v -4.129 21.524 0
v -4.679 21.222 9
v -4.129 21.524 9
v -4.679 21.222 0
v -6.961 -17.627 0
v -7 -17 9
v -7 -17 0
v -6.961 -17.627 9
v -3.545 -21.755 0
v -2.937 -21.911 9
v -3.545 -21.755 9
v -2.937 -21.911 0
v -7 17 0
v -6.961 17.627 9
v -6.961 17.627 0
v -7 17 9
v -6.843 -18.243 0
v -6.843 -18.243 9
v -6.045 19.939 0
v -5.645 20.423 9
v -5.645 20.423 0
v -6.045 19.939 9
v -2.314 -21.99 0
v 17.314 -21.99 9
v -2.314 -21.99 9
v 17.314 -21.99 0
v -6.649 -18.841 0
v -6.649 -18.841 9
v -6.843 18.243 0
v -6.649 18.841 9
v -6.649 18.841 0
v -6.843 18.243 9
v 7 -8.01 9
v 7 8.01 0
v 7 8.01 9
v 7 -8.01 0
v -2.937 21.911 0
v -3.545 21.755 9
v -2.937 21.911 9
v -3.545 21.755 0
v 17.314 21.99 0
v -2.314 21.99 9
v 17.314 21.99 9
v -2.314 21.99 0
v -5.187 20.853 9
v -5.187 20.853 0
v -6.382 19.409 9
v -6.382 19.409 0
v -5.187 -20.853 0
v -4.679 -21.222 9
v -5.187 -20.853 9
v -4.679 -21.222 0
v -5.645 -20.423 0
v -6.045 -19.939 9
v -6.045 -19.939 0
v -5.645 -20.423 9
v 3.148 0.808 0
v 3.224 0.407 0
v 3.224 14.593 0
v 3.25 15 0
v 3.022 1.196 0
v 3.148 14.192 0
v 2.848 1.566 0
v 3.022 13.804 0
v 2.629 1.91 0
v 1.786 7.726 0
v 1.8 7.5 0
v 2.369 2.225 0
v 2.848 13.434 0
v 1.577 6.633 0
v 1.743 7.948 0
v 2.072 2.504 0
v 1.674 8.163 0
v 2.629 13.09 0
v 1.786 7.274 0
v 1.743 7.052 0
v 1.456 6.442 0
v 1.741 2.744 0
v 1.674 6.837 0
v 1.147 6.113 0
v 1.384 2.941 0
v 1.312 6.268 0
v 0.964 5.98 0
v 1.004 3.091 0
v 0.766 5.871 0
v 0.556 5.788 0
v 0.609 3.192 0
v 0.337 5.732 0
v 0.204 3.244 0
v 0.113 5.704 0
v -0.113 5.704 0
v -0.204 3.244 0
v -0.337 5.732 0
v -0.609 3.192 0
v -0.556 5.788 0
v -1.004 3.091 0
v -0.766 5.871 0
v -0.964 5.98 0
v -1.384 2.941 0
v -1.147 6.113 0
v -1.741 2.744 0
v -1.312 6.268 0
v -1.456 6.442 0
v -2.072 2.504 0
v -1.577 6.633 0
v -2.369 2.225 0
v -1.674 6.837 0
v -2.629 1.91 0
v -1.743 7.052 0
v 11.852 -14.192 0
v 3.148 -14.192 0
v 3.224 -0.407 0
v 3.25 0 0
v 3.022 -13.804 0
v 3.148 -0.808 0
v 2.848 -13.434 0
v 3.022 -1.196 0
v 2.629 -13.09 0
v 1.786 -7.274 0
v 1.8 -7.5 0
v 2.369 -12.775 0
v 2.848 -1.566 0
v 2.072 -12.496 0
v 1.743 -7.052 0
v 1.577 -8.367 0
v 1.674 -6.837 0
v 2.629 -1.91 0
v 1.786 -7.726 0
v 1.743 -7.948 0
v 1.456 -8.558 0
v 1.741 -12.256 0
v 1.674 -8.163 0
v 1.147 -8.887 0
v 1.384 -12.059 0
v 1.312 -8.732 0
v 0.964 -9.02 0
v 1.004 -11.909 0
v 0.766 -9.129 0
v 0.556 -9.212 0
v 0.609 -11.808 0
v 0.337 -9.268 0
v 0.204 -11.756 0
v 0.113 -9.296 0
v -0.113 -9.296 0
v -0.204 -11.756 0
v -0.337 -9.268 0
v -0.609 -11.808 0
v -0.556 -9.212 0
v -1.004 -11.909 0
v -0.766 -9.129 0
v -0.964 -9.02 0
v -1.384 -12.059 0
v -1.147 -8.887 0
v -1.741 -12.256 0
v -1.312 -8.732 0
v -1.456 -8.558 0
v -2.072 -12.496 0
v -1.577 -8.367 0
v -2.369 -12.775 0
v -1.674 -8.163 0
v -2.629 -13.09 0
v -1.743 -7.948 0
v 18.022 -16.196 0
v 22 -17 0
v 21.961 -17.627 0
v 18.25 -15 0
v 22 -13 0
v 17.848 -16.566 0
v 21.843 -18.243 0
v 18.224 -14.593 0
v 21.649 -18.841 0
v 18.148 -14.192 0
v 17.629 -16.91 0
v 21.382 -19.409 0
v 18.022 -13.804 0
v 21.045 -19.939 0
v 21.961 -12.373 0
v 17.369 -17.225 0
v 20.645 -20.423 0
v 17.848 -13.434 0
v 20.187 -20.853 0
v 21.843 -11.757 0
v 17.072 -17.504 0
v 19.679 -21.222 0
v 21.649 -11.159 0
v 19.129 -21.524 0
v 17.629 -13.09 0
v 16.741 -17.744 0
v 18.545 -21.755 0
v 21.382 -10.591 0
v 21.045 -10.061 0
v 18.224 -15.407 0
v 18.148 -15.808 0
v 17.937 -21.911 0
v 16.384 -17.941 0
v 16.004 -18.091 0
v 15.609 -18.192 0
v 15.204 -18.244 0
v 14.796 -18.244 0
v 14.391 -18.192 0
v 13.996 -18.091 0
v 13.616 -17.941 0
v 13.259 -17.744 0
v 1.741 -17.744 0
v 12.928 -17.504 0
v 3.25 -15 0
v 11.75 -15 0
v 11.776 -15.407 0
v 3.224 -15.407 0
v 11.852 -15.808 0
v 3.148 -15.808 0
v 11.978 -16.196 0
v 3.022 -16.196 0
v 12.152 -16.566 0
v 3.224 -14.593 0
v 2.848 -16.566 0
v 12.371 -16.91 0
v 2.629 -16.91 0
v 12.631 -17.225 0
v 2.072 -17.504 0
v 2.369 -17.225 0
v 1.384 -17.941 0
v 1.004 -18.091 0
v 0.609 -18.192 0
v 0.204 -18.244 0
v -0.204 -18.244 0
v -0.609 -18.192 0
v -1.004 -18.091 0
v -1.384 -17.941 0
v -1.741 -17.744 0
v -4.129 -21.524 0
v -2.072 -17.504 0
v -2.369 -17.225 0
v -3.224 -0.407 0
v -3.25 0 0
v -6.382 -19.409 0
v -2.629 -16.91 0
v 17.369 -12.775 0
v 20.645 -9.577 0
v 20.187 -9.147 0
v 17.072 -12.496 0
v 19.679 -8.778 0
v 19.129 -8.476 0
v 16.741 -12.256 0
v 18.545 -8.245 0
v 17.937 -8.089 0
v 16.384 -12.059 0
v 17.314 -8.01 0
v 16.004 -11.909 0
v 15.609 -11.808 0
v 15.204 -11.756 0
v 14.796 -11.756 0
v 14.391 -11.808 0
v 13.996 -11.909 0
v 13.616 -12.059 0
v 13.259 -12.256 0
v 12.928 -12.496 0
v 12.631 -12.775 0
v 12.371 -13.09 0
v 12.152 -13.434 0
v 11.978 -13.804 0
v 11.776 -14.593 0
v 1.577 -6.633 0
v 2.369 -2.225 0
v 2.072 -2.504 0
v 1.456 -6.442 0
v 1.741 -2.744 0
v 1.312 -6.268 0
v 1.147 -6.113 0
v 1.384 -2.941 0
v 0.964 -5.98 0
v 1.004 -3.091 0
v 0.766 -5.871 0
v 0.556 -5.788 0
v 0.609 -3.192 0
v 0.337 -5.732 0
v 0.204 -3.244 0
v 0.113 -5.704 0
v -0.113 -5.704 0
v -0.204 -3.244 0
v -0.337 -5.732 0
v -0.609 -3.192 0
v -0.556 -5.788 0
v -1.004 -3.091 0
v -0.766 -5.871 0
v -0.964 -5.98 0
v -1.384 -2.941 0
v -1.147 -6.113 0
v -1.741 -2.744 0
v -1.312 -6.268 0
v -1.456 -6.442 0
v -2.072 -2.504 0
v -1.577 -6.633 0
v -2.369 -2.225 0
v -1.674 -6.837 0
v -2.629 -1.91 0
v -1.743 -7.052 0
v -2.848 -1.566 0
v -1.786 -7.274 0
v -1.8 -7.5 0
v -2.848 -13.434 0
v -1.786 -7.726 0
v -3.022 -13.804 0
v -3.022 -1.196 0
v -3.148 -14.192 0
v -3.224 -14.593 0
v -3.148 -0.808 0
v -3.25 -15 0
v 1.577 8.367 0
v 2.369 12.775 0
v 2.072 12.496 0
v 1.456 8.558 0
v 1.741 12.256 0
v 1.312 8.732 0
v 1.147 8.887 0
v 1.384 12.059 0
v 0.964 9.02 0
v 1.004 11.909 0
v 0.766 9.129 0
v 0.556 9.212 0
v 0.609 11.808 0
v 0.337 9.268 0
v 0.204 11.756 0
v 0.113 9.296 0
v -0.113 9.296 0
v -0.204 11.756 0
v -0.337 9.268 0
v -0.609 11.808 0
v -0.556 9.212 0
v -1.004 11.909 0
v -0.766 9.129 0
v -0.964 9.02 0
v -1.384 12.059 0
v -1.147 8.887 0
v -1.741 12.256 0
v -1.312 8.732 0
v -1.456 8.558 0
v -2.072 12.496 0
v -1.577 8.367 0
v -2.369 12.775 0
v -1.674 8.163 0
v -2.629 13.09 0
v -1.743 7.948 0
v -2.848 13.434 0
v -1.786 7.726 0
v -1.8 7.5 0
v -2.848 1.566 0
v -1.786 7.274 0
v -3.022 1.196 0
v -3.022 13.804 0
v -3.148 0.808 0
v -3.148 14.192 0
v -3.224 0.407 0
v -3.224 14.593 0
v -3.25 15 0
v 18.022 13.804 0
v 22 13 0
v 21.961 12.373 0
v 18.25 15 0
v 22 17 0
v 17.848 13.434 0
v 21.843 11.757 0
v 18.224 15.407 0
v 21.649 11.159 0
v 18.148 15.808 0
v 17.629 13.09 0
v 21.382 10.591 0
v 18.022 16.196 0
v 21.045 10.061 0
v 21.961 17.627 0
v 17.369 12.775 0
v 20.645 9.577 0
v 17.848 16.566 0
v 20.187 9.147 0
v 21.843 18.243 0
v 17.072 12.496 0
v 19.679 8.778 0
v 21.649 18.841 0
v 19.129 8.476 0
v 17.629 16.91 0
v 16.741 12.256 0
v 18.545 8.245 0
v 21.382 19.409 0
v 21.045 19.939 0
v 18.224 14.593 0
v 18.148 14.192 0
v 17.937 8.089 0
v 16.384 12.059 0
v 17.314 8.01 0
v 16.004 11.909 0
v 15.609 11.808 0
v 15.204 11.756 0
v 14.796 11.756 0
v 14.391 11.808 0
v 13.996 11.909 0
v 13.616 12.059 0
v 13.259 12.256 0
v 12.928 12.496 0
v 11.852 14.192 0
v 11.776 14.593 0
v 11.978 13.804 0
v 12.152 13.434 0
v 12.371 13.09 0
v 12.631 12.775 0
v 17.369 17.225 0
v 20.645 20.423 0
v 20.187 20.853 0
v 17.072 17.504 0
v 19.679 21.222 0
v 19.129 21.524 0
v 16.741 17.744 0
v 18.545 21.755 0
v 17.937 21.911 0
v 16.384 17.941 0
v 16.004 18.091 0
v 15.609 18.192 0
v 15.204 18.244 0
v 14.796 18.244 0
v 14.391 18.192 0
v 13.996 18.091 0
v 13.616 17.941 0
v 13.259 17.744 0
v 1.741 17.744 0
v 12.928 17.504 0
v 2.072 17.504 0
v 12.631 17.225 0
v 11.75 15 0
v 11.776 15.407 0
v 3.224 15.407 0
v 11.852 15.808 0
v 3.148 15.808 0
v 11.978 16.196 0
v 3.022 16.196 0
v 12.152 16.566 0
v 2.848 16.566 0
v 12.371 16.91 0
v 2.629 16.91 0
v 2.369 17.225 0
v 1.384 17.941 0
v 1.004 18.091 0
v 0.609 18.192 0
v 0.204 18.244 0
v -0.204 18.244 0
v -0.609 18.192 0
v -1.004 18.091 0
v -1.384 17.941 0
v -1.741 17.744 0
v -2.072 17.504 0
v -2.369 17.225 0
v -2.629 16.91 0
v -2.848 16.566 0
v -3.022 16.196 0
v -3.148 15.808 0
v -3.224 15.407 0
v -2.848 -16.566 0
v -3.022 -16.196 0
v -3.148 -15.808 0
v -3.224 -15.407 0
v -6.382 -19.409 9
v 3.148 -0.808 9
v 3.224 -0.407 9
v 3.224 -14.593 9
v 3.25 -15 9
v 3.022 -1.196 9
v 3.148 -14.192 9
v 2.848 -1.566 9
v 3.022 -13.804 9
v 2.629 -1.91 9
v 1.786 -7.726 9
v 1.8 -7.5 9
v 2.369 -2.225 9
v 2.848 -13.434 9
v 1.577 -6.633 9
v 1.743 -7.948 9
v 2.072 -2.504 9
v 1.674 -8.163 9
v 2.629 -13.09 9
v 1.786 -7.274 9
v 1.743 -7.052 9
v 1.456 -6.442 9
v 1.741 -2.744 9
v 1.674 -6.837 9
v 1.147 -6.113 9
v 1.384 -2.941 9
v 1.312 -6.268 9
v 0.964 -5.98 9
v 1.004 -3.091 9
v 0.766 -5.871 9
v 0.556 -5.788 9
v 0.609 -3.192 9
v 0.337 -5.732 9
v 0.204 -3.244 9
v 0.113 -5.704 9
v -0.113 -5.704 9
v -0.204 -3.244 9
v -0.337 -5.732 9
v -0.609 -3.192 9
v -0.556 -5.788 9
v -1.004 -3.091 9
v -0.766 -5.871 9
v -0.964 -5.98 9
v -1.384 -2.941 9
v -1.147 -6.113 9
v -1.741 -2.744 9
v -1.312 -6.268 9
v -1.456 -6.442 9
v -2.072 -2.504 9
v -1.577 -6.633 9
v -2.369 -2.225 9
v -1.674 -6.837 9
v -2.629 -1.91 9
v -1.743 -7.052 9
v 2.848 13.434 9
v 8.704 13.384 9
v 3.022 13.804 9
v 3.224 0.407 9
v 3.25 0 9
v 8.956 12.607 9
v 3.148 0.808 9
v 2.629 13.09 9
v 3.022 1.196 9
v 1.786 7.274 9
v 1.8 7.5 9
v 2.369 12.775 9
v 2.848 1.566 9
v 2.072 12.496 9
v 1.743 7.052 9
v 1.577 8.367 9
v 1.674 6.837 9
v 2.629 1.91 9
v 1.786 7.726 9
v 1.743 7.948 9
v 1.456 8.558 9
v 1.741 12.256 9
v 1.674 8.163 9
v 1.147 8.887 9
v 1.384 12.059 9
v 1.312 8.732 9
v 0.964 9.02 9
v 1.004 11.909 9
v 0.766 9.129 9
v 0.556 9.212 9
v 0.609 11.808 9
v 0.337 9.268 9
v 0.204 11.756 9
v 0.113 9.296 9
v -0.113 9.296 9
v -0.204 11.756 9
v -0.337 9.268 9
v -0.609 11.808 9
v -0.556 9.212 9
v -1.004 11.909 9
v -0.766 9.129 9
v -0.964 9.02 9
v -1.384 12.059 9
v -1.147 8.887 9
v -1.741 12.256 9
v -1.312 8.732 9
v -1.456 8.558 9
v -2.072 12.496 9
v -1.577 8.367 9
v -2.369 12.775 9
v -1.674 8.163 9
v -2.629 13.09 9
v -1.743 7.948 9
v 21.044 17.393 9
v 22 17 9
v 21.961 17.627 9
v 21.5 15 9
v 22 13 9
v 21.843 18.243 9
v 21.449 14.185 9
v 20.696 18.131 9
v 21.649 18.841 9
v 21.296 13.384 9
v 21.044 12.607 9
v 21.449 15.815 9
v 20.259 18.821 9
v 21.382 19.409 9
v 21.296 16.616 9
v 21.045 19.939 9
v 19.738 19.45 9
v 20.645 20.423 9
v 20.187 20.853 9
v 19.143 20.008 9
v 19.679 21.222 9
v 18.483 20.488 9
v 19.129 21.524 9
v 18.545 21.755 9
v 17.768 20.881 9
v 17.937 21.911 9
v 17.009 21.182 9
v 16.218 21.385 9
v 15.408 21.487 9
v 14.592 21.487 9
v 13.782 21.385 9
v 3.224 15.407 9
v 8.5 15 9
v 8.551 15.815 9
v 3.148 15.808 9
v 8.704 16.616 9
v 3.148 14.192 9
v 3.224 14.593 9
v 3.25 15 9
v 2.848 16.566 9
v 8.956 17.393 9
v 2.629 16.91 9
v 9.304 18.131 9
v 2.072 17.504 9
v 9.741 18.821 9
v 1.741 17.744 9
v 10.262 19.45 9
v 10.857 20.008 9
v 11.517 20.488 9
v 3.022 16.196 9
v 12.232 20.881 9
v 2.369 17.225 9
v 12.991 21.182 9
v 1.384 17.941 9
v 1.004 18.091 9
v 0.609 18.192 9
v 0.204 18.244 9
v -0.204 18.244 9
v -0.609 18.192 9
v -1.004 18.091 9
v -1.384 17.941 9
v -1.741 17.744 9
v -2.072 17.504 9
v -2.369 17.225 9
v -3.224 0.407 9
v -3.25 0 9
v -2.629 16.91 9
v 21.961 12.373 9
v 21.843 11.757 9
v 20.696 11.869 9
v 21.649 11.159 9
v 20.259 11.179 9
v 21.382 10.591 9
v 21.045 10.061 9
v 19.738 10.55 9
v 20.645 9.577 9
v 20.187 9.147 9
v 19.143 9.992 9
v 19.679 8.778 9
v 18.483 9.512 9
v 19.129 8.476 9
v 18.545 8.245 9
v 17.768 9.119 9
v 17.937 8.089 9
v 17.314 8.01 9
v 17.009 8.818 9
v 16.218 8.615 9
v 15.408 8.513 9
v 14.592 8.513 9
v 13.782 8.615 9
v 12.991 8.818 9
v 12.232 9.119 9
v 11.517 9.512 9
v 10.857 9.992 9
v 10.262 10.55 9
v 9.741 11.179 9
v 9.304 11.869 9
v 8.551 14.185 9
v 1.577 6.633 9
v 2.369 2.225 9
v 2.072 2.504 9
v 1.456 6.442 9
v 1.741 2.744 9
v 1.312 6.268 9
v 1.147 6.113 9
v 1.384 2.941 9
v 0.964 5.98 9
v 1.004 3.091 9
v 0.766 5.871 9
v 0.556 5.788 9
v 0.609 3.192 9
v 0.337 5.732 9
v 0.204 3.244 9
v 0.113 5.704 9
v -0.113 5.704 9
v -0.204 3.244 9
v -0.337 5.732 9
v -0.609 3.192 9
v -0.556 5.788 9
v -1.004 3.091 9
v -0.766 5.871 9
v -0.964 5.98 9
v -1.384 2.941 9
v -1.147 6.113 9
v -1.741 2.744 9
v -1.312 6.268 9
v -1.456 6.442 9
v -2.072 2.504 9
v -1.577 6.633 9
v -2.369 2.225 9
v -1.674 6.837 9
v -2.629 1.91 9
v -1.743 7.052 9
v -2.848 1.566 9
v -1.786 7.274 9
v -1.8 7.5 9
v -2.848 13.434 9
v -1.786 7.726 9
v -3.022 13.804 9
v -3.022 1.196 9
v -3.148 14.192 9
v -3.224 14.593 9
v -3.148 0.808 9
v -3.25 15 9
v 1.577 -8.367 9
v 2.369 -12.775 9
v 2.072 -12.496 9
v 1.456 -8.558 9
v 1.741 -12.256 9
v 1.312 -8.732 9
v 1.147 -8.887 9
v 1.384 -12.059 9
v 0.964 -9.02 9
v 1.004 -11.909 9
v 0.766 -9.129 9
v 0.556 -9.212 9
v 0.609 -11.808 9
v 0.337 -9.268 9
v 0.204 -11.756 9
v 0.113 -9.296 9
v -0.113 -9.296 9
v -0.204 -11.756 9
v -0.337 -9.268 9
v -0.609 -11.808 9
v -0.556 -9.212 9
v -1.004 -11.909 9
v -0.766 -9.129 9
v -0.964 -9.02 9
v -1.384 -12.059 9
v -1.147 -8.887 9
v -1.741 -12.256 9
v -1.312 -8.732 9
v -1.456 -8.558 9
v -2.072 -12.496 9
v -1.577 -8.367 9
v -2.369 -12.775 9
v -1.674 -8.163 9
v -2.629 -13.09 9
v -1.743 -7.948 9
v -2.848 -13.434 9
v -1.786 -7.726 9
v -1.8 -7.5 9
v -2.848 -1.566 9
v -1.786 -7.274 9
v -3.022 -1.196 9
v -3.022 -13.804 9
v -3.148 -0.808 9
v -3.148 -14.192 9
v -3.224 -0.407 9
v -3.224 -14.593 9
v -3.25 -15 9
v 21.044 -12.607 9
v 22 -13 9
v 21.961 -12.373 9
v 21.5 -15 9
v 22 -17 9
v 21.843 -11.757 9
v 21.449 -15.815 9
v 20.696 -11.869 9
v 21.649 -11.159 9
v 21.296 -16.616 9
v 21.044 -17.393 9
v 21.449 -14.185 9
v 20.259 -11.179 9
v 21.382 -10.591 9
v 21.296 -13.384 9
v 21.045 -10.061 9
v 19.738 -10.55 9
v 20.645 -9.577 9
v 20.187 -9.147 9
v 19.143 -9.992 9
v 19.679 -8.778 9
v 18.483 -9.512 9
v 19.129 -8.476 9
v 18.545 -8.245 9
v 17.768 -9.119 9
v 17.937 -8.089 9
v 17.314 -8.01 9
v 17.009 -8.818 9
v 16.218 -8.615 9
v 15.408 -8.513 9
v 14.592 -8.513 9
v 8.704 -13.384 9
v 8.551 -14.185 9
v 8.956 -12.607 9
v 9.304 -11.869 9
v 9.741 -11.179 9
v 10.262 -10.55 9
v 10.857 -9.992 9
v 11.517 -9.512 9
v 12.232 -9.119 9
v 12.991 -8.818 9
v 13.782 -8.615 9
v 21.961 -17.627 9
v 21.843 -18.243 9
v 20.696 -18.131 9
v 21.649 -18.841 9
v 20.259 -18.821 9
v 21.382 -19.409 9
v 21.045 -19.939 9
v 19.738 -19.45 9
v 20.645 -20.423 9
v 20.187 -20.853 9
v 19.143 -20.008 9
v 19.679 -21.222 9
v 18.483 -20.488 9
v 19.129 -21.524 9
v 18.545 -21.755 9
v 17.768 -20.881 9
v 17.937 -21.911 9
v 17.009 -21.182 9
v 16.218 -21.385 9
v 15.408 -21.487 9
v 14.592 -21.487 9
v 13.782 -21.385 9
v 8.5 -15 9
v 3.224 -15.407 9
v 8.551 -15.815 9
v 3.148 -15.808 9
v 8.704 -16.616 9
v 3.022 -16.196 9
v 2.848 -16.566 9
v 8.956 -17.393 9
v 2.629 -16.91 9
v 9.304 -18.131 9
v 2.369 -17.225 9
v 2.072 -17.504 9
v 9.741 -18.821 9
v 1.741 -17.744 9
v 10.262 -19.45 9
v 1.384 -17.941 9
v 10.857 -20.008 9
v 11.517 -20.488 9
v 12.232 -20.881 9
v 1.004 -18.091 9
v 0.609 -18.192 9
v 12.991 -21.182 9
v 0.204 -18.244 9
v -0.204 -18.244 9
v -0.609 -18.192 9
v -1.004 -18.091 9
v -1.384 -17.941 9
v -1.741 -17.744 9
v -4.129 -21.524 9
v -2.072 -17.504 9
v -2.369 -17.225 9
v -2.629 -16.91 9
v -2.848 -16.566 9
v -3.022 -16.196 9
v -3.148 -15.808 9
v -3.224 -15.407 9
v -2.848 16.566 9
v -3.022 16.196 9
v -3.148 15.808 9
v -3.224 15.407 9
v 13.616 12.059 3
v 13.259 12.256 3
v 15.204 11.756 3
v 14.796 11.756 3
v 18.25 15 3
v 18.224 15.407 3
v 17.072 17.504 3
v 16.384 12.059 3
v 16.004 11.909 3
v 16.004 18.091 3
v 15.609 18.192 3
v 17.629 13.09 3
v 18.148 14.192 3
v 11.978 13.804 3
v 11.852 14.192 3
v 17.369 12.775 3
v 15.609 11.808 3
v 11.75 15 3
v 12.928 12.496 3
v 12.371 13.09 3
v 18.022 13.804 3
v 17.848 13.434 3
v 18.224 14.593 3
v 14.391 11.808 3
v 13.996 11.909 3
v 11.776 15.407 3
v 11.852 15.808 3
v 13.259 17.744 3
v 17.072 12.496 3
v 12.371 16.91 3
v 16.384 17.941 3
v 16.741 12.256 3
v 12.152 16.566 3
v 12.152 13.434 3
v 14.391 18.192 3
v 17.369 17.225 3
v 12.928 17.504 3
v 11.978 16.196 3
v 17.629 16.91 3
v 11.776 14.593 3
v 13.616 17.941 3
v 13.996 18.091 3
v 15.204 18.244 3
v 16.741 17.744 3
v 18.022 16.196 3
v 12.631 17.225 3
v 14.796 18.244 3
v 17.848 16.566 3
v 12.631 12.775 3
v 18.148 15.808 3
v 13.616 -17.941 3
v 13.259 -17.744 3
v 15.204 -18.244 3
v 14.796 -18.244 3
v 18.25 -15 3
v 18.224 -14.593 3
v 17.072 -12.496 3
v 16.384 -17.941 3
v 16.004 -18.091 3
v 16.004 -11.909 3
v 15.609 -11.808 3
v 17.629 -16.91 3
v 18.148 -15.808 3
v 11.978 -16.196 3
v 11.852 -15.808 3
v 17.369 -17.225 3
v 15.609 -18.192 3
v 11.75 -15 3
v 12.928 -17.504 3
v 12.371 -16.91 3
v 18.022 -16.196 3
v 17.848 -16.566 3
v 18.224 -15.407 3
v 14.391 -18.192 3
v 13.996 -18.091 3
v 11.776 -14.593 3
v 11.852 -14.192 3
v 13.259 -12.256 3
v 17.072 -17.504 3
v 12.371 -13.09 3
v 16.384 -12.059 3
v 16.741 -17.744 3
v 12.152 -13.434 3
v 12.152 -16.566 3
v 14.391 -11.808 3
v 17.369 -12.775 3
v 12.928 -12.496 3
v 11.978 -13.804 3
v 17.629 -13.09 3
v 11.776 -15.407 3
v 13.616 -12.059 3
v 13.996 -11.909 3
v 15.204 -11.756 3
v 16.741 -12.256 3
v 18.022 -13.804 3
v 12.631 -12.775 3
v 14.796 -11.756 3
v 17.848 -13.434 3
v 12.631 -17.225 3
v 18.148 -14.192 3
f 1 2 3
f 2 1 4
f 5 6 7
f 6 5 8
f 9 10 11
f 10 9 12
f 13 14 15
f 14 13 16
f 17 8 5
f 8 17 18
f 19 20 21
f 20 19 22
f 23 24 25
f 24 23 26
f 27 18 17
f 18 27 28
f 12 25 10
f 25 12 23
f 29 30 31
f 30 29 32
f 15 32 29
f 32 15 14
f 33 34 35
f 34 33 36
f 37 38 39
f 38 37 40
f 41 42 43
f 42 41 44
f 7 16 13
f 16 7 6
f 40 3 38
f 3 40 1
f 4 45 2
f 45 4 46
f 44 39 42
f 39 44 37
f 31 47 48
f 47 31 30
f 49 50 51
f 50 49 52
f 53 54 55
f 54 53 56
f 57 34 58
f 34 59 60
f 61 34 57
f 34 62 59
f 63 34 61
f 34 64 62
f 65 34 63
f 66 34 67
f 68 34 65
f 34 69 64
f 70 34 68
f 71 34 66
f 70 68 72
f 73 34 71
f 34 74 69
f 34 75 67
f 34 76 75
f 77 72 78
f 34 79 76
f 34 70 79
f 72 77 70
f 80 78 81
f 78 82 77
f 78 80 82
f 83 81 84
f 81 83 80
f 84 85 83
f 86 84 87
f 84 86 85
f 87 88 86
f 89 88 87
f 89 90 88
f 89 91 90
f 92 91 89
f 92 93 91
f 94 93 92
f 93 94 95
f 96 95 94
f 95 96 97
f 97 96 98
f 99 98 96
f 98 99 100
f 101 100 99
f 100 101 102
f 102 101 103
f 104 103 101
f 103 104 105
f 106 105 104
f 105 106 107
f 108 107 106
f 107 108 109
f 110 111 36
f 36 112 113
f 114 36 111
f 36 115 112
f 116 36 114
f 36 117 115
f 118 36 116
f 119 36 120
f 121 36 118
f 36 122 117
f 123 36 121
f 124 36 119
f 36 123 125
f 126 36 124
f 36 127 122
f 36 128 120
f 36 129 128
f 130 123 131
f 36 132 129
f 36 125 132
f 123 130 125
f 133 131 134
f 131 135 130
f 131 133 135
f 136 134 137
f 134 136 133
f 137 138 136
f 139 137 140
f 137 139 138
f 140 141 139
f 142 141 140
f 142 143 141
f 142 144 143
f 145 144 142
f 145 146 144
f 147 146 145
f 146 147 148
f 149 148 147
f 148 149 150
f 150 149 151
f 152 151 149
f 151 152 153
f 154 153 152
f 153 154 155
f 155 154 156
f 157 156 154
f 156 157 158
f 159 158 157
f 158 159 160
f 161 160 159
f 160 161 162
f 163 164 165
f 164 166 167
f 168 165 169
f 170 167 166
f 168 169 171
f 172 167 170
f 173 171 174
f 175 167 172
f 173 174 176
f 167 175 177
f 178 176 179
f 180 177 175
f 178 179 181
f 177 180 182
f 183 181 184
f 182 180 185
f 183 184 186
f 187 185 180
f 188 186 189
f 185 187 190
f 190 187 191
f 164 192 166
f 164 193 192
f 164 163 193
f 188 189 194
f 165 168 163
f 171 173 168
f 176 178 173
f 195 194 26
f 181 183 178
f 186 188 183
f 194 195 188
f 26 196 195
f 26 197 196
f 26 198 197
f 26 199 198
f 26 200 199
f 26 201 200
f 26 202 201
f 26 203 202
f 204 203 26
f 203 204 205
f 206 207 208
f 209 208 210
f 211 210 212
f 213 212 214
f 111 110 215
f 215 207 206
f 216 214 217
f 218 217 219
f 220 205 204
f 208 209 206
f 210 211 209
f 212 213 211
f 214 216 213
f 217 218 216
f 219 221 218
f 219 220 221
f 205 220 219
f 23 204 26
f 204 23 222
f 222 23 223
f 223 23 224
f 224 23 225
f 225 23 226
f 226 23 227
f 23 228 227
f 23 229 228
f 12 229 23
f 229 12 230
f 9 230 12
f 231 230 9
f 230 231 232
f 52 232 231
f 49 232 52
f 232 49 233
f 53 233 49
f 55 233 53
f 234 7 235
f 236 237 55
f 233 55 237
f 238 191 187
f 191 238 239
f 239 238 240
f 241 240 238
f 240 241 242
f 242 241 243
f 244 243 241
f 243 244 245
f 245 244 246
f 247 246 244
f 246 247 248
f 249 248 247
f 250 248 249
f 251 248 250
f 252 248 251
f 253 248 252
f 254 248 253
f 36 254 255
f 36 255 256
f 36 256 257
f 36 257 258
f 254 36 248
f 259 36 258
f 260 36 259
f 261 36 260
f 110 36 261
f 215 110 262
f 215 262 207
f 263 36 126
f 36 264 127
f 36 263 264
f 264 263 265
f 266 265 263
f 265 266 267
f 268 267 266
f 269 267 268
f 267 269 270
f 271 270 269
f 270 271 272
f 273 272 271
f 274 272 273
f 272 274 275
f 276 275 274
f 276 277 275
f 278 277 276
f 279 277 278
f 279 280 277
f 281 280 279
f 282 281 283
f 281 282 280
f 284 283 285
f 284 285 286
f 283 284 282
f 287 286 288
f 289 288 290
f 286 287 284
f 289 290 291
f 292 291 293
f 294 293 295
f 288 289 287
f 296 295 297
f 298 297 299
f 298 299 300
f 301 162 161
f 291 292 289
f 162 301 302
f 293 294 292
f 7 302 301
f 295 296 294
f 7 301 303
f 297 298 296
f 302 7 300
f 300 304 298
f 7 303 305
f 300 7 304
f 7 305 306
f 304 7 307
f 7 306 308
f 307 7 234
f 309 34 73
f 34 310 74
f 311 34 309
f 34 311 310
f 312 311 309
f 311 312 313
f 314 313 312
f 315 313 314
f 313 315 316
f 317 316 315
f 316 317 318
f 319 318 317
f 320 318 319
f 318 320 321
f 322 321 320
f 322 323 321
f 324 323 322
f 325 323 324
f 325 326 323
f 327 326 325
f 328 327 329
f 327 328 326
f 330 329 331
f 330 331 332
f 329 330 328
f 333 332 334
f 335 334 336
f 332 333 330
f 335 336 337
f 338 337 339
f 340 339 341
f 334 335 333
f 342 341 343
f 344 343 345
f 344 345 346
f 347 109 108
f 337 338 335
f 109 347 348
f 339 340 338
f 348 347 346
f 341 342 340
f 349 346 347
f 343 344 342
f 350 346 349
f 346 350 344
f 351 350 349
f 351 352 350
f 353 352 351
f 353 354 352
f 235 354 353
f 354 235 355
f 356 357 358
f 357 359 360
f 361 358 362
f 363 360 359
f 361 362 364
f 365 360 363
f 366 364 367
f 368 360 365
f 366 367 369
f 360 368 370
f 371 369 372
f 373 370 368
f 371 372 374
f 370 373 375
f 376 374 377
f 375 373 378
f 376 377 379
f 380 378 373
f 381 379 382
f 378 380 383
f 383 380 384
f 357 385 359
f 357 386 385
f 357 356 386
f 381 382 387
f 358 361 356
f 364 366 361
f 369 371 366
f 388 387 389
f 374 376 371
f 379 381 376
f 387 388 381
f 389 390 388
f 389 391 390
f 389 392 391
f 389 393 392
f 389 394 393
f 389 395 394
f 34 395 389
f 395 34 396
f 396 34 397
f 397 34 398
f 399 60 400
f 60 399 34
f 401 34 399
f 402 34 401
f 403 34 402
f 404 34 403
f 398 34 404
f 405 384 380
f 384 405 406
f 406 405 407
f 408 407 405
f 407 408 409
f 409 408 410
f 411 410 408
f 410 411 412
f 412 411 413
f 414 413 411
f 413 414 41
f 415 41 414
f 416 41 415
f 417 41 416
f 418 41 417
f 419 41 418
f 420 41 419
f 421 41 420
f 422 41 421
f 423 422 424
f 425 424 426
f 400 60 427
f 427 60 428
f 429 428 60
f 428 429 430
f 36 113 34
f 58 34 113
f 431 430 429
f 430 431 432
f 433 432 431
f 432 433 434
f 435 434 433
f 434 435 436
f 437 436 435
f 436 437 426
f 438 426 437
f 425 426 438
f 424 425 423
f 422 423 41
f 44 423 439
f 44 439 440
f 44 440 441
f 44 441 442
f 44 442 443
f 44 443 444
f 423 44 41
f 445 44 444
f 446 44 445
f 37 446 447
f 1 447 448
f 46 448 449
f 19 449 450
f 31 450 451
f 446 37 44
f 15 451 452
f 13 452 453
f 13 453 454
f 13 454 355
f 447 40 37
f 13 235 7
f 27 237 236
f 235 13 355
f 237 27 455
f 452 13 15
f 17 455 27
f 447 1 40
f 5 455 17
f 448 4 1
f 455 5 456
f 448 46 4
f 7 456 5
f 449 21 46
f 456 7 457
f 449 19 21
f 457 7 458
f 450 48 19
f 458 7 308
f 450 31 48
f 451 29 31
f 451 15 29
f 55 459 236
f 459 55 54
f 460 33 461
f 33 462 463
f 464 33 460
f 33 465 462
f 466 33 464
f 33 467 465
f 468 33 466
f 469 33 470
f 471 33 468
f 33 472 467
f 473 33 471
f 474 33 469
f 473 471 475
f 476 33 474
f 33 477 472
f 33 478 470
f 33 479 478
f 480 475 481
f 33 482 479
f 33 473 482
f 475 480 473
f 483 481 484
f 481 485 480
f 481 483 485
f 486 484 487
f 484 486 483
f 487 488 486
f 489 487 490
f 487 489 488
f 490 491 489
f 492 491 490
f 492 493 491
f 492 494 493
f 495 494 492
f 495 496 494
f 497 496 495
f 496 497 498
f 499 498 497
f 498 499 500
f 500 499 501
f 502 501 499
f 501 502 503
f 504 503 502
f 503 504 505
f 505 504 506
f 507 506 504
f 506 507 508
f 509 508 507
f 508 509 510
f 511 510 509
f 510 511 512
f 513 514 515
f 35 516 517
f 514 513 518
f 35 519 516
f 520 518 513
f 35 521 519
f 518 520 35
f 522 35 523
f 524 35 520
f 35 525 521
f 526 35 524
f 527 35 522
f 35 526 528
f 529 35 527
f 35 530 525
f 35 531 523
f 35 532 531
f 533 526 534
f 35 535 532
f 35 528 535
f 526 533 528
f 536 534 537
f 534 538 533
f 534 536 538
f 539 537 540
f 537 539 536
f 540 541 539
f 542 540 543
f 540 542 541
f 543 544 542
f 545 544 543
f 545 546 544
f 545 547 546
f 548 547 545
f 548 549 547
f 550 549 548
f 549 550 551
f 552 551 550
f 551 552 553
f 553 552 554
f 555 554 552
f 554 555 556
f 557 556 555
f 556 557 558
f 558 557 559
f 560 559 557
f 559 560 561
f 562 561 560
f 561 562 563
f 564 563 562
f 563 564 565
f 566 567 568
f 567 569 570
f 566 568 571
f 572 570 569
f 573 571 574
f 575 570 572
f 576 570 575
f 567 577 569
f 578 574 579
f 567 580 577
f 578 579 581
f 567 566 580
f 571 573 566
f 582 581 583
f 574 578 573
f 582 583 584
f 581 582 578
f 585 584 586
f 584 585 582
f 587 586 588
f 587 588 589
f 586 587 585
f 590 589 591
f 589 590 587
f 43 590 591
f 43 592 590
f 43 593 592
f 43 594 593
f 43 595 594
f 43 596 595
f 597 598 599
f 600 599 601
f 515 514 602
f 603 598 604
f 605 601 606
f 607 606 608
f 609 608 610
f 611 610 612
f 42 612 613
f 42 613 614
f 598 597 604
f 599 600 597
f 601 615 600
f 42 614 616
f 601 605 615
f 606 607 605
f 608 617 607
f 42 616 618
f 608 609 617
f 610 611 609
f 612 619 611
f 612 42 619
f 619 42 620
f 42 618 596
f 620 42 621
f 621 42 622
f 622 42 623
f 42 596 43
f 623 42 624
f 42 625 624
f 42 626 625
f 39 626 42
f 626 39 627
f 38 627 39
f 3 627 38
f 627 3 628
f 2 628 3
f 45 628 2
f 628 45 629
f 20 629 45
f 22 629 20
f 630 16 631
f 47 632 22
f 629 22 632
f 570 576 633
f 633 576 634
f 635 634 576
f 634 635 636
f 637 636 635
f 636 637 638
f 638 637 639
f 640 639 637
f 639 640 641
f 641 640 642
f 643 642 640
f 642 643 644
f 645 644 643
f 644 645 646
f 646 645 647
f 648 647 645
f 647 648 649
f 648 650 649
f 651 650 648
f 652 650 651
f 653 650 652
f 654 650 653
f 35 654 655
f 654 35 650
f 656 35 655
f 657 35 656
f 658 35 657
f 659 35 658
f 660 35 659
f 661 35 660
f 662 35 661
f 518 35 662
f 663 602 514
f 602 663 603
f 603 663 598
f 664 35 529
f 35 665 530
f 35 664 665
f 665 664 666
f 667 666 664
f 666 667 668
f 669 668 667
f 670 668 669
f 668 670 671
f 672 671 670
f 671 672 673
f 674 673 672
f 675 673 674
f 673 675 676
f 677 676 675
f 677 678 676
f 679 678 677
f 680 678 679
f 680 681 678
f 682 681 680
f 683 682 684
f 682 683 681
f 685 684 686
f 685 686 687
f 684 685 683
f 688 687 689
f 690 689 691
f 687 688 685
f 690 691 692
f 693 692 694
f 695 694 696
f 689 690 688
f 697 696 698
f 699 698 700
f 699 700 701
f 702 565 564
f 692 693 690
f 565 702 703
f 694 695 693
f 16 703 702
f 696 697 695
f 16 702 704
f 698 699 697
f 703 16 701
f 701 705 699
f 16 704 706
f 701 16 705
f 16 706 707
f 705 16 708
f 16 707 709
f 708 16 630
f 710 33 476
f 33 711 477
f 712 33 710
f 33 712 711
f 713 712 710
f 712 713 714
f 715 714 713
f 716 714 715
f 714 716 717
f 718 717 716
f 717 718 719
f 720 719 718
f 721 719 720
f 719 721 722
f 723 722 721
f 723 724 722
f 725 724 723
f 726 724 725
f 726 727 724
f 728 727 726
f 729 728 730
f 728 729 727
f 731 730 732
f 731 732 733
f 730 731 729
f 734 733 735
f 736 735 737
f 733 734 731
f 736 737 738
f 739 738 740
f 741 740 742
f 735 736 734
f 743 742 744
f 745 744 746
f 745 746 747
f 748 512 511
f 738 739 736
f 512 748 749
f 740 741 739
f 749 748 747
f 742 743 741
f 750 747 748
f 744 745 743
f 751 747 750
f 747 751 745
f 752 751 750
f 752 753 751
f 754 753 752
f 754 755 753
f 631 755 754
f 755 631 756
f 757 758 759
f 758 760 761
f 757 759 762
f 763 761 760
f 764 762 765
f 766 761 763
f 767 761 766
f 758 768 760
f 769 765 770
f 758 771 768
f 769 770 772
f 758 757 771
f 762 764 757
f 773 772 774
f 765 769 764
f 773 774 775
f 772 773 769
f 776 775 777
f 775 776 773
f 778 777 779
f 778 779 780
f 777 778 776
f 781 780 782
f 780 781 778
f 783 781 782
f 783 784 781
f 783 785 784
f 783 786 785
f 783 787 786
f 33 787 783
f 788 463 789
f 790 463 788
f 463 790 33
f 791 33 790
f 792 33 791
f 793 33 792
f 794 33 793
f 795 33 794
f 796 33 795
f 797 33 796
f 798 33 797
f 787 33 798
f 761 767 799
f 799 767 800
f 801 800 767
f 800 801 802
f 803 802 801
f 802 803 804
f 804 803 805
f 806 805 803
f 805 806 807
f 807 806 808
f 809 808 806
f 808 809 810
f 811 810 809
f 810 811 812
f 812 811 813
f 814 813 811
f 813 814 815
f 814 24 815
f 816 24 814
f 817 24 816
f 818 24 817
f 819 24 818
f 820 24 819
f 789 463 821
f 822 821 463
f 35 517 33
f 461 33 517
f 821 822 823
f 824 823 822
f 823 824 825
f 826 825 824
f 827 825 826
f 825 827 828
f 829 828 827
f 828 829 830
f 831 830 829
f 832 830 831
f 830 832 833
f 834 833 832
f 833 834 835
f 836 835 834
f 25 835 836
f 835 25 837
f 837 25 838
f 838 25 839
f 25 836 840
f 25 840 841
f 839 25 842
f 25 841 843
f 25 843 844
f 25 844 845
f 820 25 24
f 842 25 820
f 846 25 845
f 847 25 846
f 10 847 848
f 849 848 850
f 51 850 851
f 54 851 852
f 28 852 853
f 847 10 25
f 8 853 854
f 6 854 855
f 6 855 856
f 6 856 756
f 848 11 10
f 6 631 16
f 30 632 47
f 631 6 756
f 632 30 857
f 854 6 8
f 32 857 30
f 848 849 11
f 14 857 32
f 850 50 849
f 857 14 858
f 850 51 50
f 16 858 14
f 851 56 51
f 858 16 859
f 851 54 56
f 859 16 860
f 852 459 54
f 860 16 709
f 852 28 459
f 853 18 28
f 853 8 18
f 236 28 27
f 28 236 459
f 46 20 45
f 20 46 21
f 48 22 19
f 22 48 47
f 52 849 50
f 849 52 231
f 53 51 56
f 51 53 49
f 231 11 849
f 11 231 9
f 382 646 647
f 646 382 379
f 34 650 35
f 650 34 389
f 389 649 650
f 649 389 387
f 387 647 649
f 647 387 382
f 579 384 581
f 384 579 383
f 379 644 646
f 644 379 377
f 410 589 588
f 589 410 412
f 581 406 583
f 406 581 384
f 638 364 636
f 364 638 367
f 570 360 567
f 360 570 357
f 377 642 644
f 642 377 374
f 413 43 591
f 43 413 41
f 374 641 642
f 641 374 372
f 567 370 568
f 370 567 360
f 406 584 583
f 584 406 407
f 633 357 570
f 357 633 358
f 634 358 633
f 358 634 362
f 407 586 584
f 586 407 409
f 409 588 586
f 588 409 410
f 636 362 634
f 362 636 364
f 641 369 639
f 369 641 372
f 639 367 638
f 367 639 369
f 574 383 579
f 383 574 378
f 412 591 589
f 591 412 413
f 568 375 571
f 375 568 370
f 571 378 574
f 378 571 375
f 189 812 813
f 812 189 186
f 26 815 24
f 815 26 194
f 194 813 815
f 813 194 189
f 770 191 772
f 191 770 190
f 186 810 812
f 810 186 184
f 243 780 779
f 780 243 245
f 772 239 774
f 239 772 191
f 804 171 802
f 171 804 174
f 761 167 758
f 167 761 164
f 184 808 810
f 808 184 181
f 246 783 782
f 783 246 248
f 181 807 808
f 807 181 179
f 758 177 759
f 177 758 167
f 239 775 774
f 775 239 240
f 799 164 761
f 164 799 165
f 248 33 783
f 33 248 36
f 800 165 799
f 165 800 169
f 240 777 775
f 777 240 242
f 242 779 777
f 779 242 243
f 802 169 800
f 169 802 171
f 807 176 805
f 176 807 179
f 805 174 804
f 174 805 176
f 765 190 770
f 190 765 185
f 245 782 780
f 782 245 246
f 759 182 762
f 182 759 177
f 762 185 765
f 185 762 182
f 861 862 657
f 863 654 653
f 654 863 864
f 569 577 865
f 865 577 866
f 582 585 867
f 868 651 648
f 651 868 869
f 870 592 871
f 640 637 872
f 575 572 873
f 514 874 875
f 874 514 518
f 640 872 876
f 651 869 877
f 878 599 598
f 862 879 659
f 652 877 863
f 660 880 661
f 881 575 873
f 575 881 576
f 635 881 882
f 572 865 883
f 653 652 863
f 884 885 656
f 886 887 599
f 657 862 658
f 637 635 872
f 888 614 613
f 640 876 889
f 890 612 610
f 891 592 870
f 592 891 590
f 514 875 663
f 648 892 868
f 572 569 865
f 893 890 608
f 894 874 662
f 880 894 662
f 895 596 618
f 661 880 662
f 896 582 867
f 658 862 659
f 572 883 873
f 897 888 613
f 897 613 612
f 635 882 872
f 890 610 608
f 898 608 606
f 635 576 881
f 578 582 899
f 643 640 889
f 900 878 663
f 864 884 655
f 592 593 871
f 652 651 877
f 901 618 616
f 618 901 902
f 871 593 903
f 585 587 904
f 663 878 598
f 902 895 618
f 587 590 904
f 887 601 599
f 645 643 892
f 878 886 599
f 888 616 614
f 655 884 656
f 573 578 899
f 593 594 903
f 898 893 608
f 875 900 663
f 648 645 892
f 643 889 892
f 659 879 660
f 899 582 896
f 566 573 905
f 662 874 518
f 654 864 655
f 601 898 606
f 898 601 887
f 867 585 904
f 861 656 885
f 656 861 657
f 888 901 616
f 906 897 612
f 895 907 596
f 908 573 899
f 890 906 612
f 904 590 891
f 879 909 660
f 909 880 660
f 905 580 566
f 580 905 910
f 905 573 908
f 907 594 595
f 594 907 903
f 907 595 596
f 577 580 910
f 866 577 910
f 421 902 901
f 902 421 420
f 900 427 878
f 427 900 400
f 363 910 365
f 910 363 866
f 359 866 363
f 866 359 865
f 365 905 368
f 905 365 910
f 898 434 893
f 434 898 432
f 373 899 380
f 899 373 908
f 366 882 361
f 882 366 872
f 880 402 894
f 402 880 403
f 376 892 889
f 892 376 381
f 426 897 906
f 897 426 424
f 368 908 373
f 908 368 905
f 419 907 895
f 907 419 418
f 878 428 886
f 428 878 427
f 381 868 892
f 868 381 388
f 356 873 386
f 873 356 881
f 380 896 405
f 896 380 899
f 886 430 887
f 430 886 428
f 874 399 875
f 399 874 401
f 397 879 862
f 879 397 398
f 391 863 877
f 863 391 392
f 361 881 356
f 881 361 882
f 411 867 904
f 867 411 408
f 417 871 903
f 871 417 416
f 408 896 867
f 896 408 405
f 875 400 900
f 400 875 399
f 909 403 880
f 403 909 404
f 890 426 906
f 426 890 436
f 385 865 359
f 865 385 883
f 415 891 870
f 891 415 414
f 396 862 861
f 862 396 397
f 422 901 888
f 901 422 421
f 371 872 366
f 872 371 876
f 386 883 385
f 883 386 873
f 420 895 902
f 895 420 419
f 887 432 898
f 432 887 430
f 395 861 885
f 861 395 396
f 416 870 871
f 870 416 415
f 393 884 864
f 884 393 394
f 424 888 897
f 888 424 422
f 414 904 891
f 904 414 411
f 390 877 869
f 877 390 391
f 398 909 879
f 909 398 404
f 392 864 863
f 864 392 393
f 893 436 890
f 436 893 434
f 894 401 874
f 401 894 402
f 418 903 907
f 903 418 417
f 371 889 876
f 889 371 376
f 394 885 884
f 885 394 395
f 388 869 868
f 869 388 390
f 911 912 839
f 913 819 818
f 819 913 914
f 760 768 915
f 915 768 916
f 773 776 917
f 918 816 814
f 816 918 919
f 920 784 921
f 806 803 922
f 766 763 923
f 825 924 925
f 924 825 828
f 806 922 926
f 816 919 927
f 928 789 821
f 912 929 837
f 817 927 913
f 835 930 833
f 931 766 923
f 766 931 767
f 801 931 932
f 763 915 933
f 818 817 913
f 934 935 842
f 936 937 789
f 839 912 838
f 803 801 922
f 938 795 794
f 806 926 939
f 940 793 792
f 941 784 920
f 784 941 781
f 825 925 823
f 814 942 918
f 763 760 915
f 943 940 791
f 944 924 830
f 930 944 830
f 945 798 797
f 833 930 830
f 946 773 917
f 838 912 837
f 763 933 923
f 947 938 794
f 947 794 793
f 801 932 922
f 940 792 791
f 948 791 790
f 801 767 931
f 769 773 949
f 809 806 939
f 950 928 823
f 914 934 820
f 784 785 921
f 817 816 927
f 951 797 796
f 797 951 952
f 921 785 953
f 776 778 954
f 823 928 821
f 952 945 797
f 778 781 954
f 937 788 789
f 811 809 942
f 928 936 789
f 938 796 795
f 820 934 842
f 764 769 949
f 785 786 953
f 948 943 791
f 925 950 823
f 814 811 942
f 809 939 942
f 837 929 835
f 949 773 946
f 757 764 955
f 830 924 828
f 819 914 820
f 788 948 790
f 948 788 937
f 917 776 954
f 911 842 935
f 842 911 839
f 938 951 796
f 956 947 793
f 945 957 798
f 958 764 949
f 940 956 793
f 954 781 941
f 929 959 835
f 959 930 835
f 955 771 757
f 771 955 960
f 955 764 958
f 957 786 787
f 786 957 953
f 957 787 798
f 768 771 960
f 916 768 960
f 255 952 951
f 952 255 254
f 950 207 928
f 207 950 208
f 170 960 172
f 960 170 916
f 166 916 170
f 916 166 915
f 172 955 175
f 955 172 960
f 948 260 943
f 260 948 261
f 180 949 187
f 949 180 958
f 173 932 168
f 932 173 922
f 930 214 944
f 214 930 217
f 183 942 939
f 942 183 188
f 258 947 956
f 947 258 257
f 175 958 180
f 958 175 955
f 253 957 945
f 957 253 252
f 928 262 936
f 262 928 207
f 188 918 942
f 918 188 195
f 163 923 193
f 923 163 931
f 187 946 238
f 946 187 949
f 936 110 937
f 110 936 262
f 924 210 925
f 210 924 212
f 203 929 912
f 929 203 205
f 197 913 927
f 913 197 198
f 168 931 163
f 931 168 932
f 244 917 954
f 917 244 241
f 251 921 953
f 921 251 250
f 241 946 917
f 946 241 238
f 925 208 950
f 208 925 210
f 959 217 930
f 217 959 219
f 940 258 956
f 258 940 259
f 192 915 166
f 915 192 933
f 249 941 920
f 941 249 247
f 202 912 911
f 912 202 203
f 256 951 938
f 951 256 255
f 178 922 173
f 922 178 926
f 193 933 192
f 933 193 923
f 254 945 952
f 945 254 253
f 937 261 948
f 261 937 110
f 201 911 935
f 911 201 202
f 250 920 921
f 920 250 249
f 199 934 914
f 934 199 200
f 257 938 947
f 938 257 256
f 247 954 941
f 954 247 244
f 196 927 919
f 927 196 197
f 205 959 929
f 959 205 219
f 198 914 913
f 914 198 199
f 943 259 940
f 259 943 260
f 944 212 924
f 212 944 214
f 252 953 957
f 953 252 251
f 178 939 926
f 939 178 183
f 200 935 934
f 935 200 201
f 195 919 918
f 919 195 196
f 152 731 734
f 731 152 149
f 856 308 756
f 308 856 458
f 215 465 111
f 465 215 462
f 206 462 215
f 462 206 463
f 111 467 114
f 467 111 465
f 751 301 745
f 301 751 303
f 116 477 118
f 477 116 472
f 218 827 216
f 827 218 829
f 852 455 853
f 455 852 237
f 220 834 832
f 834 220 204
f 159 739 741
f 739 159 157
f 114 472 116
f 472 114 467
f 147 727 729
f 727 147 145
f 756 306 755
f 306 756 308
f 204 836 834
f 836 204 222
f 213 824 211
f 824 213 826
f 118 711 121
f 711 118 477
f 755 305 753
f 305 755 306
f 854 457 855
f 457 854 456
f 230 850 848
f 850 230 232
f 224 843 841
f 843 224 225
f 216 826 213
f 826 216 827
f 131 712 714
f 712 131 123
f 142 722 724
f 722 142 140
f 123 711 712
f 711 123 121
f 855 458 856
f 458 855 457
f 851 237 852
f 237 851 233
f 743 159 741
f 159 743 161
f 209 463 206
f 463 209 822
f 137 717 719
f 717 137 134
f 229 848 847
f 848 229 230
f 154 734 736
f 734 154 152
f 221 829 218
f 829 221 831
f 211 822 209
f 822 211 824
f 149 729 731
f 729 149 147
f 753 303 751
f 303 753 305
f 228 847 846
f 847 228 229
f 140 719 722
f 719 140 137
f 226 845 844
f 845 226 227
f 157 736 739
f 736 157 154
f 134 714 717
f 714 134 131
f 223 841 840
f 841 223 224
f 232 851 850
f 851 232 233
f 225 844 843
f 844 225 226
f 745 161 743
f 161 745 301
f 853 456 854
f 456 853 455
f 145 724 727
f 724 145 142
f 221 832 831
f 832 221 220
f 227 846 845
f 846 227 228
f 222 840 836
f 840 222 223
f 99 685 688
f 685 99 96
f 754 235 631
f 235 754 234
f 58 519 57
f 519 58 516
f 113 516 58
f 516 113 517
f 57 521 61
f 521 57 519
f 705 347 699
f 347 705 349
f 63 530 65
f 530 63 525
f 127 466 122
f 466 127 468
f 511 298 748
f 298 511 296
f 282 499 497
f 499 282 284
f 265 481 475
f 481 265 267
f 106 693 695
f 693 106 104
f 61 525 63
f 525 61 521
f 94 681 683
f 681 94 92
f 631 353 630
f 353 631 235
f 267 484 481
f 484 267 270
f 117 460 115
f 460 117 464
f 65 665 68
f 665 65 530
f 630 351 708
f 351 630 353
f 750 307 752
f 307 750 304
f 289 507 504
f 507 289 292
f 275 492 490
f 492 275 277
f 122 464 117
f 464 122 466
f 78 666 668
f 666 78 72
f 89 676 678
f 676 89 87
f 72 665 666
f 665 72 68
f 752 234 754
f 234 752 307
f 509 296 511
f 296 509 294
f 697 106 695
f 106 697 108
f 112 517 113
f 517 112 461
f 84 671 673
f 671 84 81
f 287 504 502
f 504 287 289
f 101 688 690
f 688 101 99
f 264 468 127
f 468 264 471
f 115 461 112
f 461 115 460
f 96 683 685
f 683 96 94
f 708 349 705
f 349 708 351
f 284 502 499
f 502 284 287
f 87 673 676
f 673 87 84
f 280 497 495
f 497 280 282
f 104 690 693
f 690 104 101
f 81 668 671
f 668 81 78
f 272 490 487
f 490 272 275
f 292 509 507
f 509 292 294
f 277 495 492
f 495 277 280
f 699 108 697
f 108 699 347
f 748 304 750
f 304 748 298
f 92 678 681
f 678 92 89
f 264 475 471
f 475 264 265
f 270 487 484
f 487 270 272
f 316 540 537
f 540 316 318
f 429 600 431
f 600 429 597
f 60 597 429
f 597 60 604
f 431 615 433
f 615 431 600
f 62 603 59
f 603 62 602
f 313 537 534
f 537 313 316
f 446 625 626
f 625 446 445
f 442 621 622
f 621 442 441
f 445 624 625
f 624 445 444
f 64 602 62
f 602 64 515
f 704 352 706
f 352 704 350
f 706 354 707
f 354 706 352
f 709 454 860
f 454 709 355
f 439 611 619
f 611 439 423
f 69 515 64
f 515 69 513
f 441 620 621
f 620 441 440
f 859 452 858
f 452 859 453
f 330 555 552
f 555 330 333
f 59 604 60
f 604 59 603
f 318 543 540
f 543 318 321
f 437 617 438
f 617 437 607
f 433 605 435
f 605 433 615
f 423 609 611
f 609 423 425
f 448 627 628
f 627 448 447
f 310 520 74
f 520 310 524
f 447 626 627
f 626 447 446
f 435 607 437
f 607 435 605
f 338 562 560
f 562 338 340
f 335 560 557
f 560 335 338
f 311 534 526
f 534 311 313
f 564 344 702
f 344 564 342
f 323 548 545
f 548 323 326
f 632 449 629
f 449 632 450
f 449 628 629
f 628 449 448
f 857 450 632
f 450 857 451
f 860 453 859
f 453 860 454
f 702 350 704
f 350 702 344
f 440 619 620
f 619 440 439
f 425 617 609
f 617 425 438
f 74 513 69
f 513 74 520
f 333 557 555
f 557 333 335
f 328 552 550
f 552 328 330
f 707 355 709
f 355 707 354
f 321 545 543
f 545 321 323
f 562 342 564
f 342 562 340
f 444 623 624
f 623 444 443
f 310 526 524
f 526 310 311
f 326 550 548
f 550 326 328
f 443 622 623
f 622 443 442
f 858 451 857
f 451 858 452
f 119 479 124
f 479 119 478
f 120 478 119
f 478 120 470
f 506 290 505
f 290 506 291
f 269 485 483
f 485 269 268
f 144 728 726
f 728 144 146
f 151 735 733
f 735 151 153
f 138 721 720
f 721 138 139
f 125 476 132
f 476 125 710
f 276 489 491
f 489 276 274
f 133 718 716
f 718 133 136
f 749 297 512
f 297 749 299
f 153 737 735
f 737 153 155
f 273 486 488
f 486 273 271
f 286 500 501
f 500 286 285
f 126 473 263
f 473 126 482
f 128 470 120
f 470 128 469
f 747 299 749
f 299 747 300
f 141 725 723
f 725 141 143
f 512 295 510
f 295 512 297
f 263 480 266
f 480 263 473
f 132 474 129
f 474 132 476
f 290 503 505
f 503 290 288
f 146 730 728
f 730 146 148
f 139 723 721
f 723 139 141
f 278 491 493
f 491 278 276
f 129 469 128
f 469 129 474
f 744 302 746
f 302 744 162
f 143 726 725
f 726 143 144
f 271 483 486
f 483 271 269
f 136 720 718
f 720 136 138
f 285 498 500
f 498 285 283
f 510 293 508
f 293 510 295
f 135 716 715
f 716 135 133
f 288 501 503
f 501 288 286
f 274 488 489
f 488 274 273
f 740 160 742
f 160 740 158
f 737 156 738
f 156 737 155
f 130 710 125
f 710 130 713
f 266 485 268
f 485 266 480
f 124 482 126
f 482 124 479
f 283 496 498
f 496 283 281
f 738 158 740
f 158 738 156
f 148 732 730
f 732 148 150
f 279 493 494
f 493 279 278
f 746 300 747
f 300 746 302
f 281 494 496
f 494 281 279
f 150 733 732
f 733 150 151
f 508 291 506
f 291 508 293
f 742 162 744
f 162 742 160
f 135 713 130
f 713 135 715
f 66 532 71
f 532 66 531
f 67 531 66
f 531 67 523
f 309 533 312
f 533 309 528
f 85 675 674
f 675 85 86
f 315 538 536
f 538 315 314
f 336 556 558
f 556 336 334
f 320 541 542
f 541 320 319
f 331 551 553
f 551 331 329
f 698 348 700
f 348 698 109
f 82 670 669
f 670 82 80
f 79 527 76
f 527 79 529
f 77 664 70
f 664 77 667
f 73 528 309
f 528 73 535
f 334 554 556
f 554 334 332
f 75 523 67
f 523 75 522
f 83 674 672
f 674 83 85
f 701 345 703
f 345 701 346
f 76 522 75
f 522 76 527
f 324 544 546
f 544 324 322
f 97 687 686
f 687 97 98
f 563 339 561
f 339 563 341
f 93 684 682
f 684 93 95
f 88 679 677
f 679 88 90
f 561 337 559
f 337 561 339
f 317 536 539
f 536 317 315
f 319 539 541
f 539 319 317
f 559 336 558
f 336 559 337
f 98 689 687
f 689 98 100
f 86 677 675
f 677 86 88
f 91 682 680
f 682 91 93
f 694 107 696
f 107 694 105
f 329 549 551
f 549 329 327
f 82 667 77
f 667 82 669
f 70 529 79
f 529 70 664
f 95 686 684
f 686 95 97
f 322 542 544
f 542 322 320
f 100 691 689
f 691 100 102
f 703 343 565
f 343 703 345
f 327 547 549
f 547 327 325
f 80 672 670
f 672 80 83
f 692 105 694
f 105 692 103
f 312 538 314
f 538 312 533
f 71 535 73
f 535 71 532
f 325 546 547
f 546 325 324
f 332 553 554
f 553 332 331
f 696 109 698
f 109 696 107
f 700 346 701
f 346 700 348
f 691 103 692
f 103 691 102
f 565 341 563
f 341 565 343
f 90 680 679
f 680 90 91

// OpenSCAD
$fn = 50;


difference() {
	union() {
		hull() {
			translate(v = [-2.0000000000, 17.0000000000, 0]) {
				cylinder(h = 9, r = 5);
			}
			translate(v = [2.0000000000, 17.0000000000, 0]) {
				cylinder(h = 9, r = 5);
			}
			translate(v = [-2.0000000000, -17.0000000000, 0]) {
				cylinder(h = 9, r = 5);
			}
			translate(v = [2.0000000000, -17.0000000000, 0]) {
				cylinder(h = 9, r = 5);
			}
		}
		translate(v = [7.5000000000, 15.0000000000, 0]) {
			hull() {
				translate(v = [-9.5000000000, 2.0000000000, 0]) {
					cylinder(h = 9, r = 5);
				}
				translate(v = [9.5000000000, 2.0000000000, 0]) {
					cylinder(h = 9, r = 5);
				}
				translate(v = [-9.5000000000, -2.0000000000, 0]) {
					cylinder(h = 9, r = 5);
				}
				translate(v = [9.5000000000, -2.0000000000, 0]) {
					cylinder(h = 9, r = 5);
				}
			}
		}
		translate(v = [7.5000000000, -15.0000000000, 0]) {
			hull() {
				translate(v = [-9.5000000000, 2.0000000000, 0]) {
					cylinder(h = 9, r = 5);
				}
				translate(v = [9.5000000000, 2.0000000000, 0]) {
					cylinder(h = 9, r = 5);
				}
				translate(v = [-9.5000000000, -2.0000000000, 0]) {
					cylinder(h = 9, r = 5);
				}
				translate(v = [9.5000000000, -2.0000000000, 0]) {
					cylinder(h = 9, r = 5);
				}
			}
		}
	}
	union() {
		translate(v = [15.0000000000, 15.0000000000, 9]) {
			rotate(a = [0, 0, 0]) {
				difference() {
					union() {
						#translate(v = [0, 0, -9.0000000000]) {
							cylinder(h = 9, r = 2.2500000000);
						}
						#translate(v = [0, 0, -6]) {
							cylinder(h = 6, r1 = 3.2500000000, r2 = 6.5000000000);
						}
						#translate(v = [0, 0, -9.0000000000]) {
							cylinder(h = 9, r = 3.2500000000);
						}
						#translate(v = [0, 0, -9.0000000000]) {
							cylinder(h = 9, r = 2.2500000000);
						}
					}
					union();
				}
			}
		}
		translate(v = [15.0000000000, -15.0000000000, 9]) {
			rotate(a = [0, 0, 0]) {
				difference() {
					union() {
						#translate(v = [0, 0, -9.0000000000]) {
							cylinder(h = 9, r = 2.2500000000);
						}
						#translate(v = [0, 0, -6]) {
							cylinder(h = 6, r1 = 3.2500000000, r2 = 6.5000000000);
						}
						#translate(v = [0, 0, -9.0000000000]) {
							cylinder(h = 9, r = 3.2500000000);
						}
						#translate(v = [0, 0, -9.0000000000]) {
							cylinder(h = 9, r = 2.2500000000);
						}
					}
					union();
				}
			}
		}
		translate(v = [0.0000000000, -15.0000000000, 0]) {
			translate(v = [0, 0, -100]) {
				cylinder(h = 200, r = 3.2500000000);
			}
		}
		translate(v = [0, 0, -100]) {
			cylinder(h = 200, r = 3.2500000000);
		}
		translate(v = [0.0000000000, 15.0000000000, 0]) {
			translate(v = [0, 0, -100]) {
				cylinder(h = 200, r = 3.2500000000);
			}
		}
		translate(v = [0.0000000000, -15.0000000000, 0]) {
			translate(v = [0, 0, -100]) {
				cylinder(h = 200, r = 1.8000000000);
			}
		}
		translate(v = [0.0000000000, -7.5000000000, 0]) {
			translate(v = [0, 0, -100]) {
				cylinder(h = 200, r = 1.8000000000);
			}
		}
		translate(v = [0, 0, -100]) {
			cylinder(h = 200, r = 1.8000000000);
		}
		translate(v = [0.0000000000, 7.5000000000, 0]) {
			translate(v = [0, 0, -100]) {
				cylinder(h = 200, r = 1.8000000000);
			}
		}
		translate(v = [0.0000000000, 15.0000000000, 0]) {
			translate(v = [0, 0, -100]) {
				cylinder(h = 200, r = 1.8000000000);
			}
		}
	}
}
